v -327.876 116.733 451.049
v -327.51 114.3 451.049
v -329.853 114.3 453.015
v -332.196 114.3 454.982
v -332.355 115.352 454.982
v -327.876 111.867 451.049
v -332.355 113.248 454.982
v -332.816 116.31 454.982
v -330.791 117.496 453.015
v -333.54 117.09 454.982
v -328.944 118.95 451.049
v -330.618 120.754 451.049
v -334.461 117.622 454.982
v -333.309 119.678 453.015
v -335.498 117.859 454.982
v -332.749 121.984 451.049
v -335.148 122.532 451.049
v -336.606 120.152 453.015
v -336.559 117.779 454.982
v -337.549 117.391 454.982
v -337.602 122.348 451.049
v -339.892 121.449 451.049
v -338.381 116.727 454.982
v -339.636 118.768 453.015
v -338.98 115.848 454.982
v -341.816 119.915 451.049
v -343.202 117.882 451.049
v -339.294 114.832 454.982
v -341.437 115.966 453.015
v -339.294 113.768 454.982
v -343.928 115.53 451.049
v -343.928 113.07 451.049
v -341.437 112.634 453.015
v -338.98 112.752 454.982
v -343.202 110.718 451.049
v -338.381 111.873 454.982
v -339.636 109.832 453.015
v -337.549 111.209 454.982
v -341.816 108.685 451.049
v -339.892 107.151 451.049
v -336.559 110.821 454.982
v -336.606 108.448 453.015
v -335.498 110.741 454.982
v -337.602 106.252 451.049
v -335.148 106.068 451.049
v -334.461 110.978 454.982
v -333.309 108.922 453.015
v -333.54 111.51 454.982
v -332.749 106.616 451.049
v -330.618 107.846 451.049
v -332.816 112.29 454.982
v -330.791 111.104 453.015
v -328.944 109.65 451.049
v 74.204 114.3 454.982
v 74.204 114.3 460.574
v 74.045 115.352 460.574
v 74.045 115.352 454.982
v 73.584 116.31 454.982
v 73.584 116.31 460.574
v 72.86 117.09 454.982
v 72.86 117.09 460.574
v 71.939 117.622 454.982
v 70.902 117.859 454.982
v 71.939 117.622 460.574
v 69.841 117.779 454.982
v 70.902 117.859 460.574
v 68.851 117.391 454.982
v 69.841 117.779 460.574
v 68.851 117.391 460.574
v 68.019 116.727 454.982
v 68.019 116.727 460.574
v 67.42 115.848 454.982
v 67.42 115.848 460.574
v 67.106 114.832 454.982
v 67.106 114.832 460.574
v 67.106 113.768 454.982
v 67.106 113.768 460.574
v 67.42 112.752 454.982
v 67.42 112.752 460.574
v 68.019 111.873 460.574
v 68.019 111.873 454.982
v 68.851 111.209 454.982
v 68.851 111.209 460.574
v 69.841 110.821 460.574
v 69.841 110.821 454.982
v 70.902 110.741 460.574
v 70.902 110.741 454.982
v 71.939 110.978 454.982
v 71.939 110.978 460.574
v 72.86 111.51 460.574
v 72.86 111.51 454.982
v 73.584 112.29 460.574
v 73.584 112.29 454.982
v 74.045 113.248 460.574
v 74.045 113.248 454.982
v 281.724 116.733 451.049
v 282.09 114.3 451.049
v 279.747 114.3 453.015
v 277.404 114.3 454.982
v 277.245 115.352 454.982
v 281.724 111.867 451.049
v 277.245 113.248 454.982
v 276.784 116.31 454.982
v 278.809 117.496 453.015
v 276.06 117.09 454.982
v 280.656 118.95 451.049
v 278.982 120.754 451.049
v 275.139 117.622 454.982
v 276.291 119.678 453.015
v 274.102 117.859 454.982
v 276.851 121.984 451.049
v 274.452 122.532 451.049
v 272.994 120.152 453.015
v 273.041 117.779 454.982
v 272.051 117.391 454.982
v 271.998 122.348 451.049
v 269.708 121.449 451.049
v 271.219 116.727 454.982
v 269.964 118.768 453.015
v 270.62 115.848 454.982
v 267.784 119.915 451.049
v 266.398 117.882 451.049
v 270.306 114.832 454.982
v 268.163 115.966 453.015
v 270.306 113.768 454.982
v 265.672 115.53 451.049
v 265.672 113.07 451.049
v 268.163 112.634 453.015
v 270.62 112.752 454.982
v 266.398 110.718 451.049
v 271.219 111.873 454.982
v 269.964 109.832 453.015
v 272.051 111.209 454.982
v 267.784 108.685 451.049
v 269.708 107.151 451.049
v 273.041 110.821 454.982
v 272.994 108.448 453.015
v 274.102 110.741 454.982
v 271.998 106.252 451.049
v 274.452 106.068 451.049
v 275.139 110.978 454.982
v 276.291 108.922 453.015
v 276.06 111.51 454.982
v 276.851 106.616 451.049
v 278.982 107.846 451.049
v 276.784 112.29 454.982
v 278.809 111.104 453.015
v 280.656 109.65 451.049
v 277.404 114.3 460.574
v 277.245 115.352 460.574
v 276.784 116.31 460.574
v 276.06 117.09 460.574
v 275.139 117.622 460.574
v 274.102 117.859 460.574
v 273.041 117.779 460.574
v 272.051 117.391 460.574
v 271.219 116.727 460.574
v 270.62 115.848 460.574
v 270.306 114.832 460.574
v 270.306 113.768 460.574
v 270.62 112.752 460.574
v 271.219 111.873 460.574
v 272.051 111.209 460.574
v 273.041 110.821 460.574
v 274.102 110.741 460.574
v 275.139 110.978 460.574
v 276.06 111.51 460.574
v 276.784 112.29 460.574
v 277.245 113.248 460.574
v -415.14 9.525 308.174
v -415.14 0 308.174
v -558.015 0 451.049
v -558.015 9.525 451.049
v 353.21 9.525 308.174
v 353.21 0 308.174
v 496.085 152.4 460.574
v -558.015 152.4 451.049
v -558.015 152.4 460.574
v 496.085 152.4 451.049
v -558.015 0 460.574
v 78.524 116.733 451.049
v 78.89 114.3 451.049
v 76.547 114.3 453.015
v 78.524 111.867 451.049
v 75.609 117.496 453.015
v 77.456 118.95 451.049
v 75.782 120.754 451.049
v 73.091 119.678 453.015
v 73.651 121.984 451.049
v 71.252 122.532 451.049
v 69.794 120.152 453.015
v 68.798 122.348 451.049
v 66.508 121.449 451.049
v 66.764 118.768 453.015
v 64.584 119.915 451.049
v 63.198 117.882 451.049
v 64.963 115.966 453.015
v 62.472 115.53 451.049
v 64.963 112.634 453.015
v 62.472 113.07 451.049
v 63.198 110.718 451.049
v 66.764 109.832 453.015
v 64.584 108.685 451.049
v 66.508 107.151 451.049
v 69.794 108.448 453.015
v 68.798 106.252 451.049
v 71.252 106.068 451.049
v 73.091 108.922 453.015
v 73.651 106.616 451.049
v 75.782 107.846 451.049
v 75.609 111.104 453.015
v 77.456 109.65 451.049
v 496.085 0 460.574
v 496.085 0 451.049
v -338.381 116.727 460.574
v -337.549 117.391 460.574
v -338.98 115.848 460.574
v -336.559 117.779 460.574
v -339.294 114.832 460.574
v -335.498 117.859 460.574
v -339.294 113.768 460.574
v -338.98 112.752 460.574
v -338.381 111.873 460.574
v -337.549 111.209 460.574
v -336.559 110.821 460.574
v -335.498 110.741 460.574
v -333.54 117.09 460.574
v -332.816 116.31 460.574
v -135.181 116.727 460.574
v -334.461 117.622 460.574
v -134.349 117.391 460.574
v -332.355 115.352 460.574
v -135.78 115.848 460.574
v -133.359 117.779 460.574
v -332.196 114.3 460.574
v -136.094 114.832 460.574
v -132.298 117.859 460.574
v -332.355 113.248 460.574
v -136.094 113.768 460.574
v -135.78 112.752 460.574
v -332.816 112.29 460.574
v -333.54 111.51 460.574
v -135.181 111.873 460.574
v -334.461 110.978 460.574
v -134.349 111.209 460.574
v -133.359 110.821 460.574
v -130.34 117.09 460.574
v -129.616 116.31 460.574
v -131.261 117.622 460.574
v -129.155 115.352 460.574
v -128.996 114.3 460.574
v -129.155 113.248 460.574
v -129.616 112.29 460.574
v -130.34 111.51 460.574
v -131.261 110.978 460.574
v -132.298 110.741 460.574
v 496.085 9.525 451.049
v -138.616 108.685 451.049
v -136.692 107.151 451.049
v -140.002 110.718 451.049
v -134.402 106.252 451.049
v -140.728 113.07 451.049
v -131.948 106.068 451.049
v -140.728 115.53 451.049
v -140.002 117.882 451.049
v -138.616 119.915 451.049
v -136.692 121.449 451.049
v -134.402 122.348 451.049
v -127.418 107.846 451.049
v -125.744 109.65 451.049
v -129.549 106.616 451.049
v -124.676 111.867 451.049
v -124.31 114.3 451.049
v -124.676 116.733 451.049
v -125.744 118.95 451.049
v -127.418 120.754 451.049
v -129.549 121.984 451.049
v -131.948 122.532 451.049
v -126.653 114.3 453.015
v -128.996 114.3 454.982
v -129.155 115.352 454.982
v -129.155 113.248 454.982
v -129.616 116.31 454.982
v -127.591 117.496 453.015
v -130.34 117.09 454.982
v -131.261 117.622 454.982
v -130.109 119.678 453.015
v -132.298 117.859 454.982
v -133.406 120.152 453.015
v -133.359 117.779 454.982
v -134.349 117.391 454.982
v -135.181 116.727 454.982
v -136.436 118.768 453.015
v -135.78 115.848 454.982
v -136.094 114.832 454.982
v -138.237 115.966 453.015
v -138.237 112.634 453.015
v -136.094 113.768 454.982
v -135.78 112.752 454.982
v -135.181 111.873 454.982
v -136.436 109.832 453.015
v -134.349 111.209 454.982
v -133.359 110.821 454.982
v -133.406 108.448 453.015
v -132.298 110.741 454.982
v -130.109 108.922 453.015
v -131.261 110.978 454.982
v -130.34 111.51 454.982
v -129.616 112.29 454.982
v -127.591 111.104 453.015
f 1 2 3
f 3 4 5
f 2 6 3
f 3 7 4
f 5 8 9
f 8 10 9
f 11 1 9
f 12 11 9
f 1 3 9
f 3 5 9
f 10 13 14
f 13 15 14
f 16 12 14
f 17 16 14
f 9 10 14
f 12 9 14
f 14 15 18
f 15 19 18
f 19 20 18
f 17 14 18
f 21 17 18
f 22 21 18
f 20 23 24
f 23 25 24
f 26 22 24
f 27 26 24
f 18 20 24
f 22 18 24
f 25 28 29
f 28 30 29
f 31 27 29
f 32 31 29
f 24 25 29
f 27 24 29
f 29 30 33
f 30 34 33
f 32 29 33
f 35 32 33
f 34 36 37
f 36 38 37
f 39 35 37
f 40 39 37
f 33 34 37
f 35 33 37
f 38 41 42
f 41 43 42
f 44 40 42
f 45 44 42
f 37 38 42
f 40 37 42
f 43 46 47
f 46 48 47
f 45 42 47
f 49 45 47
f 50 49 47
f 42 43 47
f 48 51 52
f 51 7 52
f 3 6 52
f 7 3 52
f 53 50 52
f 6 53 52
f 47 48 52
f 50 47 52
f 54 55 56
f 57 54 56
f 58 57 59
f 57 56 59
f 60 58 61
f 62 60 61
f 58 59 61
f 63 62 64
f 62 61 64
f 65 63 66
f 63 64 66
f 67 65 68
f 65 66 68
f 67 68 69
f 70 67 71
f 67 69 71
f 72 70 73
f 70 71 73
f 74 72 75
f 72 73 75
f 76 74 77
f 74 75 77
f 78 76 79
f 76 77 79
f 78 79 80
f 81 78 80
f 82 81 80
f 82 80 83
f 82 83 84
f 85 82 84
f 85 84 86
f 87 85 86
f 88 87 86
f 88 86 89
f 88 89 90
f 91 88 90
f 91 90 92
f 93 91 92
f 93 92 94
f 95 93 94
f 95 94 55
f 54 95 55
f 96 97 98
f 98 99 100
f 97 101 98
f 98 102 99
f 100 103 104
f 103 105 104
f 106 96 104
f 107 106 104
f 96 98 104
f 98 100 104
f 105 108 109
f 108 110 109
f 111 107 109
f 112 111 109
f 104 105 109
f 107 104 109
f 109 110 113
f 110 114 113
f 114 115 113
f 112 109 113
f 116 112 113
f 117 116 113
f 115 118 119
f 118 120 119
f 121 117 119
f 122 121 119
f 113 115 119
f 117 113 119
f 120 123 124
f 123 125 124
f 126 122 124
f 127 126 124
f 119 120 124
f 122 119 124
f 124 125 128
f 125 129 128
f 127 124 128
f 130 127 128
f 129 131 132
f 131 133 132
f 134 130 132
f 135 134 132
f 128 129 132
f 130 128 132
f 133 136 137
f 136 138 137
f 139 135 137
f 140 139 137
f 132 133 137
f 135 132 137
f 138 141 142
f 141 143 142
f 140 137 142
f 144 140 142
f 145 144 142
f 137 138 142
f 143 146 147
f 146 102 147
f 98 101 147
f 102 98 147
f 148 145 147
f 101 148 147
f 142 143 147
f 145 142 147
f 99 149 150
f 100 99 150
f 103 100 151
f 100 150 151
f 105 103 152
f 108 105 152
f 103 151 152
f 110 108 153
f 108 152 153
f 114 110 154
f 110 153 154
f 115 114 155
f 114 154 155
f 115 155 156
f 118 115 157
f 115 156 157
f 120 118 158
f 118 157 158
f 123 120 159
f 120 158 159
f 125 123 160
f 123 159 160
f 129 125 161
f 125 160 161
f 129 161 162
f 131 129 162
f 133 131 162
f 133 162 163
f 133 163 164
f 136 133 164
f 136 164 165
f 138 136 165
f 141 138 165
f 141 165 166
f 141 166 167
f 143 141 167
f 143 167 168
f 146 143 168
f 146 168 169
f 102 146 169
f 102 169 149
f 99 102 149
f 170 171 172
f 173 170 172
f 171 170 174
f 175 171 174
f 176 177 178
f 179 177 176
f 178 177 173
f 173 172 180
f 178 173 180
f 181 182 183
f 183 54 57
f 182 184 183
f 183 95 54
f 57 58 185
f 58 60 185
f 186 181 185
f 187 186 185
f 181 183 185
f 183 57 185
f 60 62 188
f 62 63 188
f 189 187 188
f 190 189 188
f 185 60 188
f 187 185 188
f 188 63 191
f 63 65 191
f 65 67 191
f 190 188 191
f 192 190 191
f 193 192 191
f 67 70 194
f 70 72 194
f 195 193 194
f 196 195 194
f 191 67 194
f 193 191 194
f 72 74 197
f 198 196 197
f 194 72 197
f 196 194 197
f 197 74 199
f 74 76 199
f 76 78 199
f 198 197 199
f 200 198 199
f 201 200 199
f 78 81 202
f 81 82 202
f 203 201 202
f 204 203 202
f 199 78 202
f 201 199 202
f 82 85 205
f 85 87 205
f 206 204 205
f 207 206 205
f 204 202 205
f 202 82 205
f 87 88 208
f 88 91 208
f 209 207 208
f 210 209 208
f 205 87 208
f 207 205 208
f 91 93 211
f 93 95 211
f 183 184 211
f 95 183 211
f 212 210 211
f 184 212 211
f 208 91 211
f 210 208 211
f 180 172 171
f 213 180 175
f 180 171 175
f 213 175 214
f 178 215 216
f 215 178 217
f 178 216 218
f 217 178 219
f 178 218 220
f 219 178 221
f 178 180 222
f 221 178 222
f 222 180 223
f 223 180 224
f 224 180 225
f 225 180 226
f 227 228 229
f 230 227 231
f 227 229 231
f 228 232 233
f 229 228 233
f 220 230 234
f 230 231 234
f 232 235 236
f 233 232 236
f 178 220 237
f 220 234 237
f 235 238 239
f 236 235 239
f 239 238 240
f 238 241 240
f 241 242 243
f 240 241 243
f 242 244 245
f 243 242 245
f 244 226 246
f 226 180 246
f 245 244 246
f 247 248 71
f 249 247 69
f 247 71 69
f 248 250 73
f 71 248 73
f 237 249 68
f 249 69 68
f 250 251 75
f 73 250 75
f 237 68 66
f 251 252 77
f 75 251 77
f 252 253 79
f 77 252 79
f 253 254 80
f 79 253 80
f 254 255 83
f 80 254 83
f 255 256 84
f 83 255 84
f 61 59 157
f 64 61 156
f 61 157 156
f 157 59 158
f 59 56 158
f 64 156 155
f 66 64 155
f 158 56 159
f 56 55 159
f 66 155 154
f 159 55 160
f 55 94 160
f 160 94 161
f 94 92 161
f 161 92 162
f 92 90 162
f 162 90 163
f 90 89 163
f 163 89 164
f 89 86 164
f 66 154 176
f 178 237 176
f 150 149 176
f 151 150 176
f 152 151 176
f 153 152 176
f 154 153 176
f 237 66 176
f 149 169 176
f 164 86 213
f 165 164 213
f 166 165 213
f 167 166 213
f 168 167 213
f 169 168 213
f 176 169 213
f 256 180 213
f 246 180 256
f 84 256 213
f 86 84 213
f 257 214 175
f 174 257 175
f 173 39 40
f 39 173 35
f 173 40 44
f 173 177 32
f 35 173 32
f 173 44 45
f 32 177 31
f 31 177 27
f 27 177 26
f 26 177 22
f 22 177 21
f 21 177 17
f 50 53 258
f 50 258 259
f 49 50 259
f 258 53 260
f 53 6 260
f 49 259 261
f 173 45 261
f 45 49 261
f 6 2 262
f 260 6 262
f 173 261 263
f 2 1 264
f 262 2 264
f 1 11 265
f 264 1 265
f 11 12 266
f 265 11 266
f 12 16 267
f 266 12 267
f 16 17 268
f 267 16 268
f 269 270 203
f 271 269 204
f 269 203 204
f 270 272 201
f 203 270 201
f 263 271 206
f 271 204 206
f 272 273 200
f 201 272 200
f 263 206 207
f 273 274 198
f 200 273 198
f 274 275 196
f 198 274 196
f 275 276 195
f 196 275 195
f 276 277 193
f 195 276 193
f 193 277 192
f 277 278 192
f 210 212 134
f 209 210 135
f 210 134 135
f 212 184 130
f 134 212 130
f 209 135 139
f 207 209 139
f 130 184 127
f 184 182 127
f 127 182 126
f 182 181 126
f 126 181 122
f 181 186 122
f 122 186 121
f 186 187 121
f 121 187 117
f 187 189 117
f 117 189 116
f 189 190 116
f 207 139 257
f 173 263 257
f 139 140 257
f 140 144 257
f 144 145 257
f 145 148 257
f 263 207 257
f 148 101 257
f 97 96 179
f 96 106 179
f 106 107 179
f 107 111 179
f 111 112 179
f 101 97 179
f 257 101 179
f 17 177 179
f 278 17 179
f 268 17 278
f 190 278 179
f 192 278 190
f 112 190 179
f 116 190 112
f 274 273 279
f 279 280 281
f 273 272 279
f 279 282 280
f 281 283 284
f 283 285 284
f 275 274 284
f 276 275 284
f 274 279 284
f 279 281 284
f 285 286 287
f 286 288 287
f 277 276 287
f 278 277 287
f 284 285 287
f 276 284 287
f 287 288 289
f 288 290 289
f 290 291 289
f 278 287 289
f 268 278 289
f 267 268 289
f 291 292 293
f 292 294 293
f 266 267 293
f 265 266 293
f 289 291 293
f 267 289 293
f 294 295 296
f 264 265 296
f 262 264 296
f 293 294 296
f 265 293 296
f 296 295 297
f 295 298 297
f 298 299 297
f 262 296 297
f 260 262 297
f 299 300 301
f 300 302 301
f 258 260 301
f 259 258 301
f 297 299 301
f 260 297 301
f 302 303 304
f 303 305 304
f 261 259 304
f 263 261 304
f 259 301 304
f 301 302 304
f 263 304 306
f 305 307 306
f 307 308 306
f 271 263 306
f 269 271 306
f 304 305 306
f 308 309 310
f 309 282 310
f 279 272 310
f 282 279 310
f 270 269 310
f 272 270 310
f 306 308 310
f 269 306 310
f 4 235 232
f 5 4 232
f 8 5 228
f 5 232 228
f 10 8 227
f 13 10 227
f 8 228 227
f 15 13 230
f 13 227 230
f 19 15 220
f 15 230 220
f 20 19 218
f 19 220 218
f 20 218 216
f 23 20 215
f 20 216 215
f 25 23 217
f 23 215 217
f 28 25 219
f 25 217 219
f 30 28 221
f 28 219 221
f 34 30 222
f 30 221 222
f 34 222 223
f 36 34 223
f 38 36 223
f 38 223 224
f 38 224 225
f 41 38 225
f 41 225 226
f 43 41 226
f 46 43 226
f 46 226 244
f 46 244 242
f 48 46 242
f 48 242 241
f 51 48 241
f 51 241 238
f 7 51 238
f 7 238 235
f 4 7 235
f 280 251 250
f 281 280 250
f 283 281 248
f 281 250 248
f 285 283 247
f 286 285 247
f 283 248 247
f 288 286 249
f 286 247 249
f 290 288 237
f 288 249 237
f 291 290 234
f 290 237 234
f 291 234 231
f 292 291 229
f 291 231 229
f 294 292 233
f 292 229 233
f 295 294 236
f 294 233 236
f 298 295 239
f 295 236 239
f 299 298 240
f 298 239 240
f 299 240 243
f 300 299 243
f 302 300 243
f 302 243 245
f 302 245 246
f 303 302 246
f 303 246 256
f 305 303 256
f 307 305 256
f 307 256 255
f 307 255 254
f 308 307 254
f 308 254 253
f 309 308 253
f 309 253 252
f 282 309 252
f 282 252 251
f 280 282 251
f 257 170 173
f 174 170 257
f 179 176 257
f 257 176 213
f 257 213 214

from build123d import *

# Parameters (mm, degrees)
SKETCH2_W                                           = 1073.15
SKETCH2_H                                           = 1073.15
BOSS_EXTRUDE2_DEPTH                                 = 152.4
SKETCH6_W                                           = 1054.1
SKETCH6_H                                           = 1054.1
CUT_EXTRUDE3_DEPTH                                  = 142.875
SKETCH7_W                                           = 768.35
SKETCH7_H                                           = 768.35
CUT_EXTRUDE4_DEPTH                                  = 142.875
SKETCH8_R                                           = 3.5687
CUT_EXTRUDE5_DEPTH                                  = 1270
SKETCH9_R                                           = 2.50063
CUT_EXTRUDE6_DEPTH                                  = 1270
CUT_EXTRUDE7_DEPTH                                  = 1016
CUT_EXTRUDE8_DEPTH                                  = 154.94
CUT_EXTRUDE8_DEPTH_BACK                             = 10.16
CSK_FOR_1_4_FLAT_HEAD_MACHINE_SCREW_100_D           = 6.7564
CSK_FOR_1_4_FLAT_HEAD_MACHINE_SCREW_100_CSINK_D     = 16.510254
CSK_FOR_1_4_FLAT_HEAD_MACHINE_SCREW_100_CSINK_ANGLE = 100
CSK_FOR_1_4_FLAT_HEAD_MACHINE_SCREW_2_D             = 6.7564
CSK_FOR_1_4_FLAT_HEAD_MACHINE_SCREW_2_CSINK_D       = 16.510254
CSK_FOR_1_4_FLAT_HEAD_MACHINE_SCREW_2_CSINK_ANGLE   = 100
CSK_FOR_1_4_FLAT_HEAD_MACHINE_SCREW_3_D             = 6.7564
CSK_FOR_1_4_FLAT_HEAD_MACHINE_SCREW_3_CSINK_D       = 16.510254
CSK_FOR_1_4_FLAT_HEAD_MACHINE_SCREW_3_CSINK_ANGLE   = 100
CSK_FOR_1_4_FLAT_HEAD_MACHINE_SCREW_4_D             = 6.7564
CSK_FOR_1_4_FLAT_HEAD_MACHINE_SCREW_4_CSINK_D       = 16.510254
CSK_FOR_1_4_FLAT_HEAD_MACHINE_SCREW_4_CSINK_ANGLE   = 100


with BuildPart() as part:
    # Sketch2 → Boss-Extrude2 (new body)
    with BuildSketch(Plane(origin=(0, 0, 0), x_dir=(1, 0, 0), z_dir=(0, 1, 0))):
        with Locations((-30.964668371, 76.000745145)):
            Rectangle(SKETCH2_W, SKETCH2_H)
    extrude(amount=BOSS_EXTRUDE2_DEPTH)

    # Sketch6 → Cut-Extrude3 (cut)
    with BuildSketch(Plane(origin=(0, 152.4, 0), x_dir=(1, 0, 0), z_dir=(0, 1, 0))):
        with Locations((-30.964668371, 76.000745145)):
            Rectangle(SKETCH6_W, SKETCH6_H)
    extrude(amount=-CUT_EXTRUDE3_DEPTH, mode=Mode.SUBTRACT)

    # Sketch7 → Cut-Extrude4 (cut)
    with BuildSketch(Plane(origin=(0, 9.525, 0), x_dir=(1, 0, 0), z_dir=(0, 1, 0))):
        with Locations((-30.964668371, 76.000745145)):
            Rectangle(SKETCH7_W, SKETCH7_H)
    extrude(amount=-CUT_EXTRUDE4_DEPTH, mode=Mode.SUBTRACT)

    # Sketch8 → Cut-Extrude5 (cut)
    with BuildSketch(Plane.XY.offset(460.574254855)):
        with Locations((273.835331629, 114.3)):
            Circle(SKETCH8_R)
        with Locations((70.635331629, 114.3)):
            Circle(SKETCH8_R)
        with Locations((-132.564668371, 114.3)):
            Circle(SKETCH8_R)
        with Locations((-335.764668371, 114.3)):
            Circle(SKETCH8_R)
    extrude(amount=-CUT_EXTRUDE5_DEPTH, mode=Mode.SUBTRACT)

    # Sketch9 → Cut-Extrude6 (cut)
    with BuildSketch(Plane.ZY.offset(567.539668371)):
        with Locations((295.474254855, 114.3)):
            Circle(SKETCH9_R)
        with Locations((146.884254855, 114.3)):
            Circle(SKETCH9_R)
        with Locations((-1.705745145, 114.3)):
            Circle(SKETCH9_R)
        with Locations((-150.295745145, 114.3)):
            Circle(SKETCH9_R)
        with Locations((-298.885745145, 114.3)):
            Circle(SKETCH9_R)
        with Locations((-447.475745145, 114.3)):
            Circle(SKETCH9_R)
    extrude(amount=-CUT_EXTRUDE6_DEPTH, mode=Mode.SUBTRACT)

    # Sketch10 → Cut-Extrude7 (cut)
    with BuildSketch(Plane.XZ):
        Polygon((-415.139668371, -460.175745145), (-415.139668371, 308.174254855), (-567.539668371, 460.574254855), (-567.539668371, -612.575745145), (505.610331629, -612.575745145), (505.610331629, 460.574254855), (353.210331629, 308.174254855), (353.210331629, -460.175745145), align=None)
    extrude(amount=-CUT_EXTRUDE7_DEPTH, mode=Mode.SUBTRACT)

    # Sketch11 → Cut-Extrude8 (cut, two sides: drawn at the far end of the back side and taken through both)
    with BuildSketch(Plane(origin=(0, 9.525, 0), x_dir=(1, 0, 0), z_dir=(0, 1, 0)).offset(-CUT_EXTRUDE8_DEPTH_BACK)):
        Polygon((-567.539668371, -460.574254855), (-558.014668371, -451.049254855), (-558.014668371, -460.574254855), align=None)
        Polygon((496.085331629, -451.049254855), (505.610331629, -460.574254855), (496.085331629, -460.574254855), align=None)
    extrude(amount=CUT_EXTRUDE8_DEPTH + CUT_EXTRUDE8_DEPTH_BACK, mode=Mode.SUBTRACT)

    # CSK for 1_4 Flat Head Machine Screw _100 (through all)
    with Locations(Plane(origin=(273.835331629, 114.3, 451.049254855), x_dir=(-1, 0, 0), z_dir=(0, 0, -1))):
        with Locations((0, 0)):
            CounterSinkHole(CSK_FOR_1_4_FLAT_HEAD_MACHINE_SCREW_100_D / 2, CSK_FOR_1_4_FLAT_HEAD_MACHINE_SCREW_100_CSINK_D / 2, counter_sink_angle=CSK_FOR_1_4_FLAT_HEAD_MACHINE_SCREW_100_CSINK_ANGLE)

    # CSK for 1_4 Flat Head Machine Screw  2 (through all)
    with Locations(Plane(origin=(70.635331629, 114.3, 451.049254855), x_dir=(-1, 0, 0), z_dir=(0, 0, -1))):
        with Locations((0, 0)):
            CounterSinkHole(CSK_FOR_1_4_FLAT_HEAD_MACHINE_SCREW_2_D / 2, CSK_FOR_1_4_FLAT_HEAD_MACHINE_SCREW_2_CSINK_D / 2, counter_sink_angle=CSK_FOR_1_4_FLAT_HEAD_MACHINE_SCREW_2_CSINK_ANGLE)

    # CSK for 1_4 Flat Head Machine Screw  3 (through all)
    with Locations(Plane(origin=(-132.564668371, 114.3, 451.049254855), x_dir=(-1, 0, 0), z_dir=(0, 0, -1))):
        with Locations((0, 0)):
            CounterSinkHole(CSK_FOR_1_4_FLAT_HEAD_MACHINE_SCREW_3_D / 2, CSK_FOR_1_4_FLAT_HEAD_MACHINE_SCREW_3_CSINK_D / 2, counter_sink_angle=CSK_FOR_1_4_FLAT_HEAD_MACHINE_SCREW_3_CSINK_ANGLE)

    # CSK for 1_4 Flat Head Machine Screw  4 (through all)
    with Locations(Plane(origin=(-335.764668371, 114.3, 451.049254855), x_dir=(-1, 0, 0), z_dir=(0, 0, -1))):
        with Locations((0, 0)):
            CounterSinkHole(CSK_FOR_1_4_FLAT_HEAD_MACHINE_SCREW_4_D / 2, CSK_FOR_1_4_FLAT_HEAD_MACHINE_SCREW_4_CSINK_D / 2, counter_sink_angle=CSK_FOR_1_4_FLAT_HEAD_MACHINE_SCREW_4_CSINK_ANGLE)


solid = part.part
